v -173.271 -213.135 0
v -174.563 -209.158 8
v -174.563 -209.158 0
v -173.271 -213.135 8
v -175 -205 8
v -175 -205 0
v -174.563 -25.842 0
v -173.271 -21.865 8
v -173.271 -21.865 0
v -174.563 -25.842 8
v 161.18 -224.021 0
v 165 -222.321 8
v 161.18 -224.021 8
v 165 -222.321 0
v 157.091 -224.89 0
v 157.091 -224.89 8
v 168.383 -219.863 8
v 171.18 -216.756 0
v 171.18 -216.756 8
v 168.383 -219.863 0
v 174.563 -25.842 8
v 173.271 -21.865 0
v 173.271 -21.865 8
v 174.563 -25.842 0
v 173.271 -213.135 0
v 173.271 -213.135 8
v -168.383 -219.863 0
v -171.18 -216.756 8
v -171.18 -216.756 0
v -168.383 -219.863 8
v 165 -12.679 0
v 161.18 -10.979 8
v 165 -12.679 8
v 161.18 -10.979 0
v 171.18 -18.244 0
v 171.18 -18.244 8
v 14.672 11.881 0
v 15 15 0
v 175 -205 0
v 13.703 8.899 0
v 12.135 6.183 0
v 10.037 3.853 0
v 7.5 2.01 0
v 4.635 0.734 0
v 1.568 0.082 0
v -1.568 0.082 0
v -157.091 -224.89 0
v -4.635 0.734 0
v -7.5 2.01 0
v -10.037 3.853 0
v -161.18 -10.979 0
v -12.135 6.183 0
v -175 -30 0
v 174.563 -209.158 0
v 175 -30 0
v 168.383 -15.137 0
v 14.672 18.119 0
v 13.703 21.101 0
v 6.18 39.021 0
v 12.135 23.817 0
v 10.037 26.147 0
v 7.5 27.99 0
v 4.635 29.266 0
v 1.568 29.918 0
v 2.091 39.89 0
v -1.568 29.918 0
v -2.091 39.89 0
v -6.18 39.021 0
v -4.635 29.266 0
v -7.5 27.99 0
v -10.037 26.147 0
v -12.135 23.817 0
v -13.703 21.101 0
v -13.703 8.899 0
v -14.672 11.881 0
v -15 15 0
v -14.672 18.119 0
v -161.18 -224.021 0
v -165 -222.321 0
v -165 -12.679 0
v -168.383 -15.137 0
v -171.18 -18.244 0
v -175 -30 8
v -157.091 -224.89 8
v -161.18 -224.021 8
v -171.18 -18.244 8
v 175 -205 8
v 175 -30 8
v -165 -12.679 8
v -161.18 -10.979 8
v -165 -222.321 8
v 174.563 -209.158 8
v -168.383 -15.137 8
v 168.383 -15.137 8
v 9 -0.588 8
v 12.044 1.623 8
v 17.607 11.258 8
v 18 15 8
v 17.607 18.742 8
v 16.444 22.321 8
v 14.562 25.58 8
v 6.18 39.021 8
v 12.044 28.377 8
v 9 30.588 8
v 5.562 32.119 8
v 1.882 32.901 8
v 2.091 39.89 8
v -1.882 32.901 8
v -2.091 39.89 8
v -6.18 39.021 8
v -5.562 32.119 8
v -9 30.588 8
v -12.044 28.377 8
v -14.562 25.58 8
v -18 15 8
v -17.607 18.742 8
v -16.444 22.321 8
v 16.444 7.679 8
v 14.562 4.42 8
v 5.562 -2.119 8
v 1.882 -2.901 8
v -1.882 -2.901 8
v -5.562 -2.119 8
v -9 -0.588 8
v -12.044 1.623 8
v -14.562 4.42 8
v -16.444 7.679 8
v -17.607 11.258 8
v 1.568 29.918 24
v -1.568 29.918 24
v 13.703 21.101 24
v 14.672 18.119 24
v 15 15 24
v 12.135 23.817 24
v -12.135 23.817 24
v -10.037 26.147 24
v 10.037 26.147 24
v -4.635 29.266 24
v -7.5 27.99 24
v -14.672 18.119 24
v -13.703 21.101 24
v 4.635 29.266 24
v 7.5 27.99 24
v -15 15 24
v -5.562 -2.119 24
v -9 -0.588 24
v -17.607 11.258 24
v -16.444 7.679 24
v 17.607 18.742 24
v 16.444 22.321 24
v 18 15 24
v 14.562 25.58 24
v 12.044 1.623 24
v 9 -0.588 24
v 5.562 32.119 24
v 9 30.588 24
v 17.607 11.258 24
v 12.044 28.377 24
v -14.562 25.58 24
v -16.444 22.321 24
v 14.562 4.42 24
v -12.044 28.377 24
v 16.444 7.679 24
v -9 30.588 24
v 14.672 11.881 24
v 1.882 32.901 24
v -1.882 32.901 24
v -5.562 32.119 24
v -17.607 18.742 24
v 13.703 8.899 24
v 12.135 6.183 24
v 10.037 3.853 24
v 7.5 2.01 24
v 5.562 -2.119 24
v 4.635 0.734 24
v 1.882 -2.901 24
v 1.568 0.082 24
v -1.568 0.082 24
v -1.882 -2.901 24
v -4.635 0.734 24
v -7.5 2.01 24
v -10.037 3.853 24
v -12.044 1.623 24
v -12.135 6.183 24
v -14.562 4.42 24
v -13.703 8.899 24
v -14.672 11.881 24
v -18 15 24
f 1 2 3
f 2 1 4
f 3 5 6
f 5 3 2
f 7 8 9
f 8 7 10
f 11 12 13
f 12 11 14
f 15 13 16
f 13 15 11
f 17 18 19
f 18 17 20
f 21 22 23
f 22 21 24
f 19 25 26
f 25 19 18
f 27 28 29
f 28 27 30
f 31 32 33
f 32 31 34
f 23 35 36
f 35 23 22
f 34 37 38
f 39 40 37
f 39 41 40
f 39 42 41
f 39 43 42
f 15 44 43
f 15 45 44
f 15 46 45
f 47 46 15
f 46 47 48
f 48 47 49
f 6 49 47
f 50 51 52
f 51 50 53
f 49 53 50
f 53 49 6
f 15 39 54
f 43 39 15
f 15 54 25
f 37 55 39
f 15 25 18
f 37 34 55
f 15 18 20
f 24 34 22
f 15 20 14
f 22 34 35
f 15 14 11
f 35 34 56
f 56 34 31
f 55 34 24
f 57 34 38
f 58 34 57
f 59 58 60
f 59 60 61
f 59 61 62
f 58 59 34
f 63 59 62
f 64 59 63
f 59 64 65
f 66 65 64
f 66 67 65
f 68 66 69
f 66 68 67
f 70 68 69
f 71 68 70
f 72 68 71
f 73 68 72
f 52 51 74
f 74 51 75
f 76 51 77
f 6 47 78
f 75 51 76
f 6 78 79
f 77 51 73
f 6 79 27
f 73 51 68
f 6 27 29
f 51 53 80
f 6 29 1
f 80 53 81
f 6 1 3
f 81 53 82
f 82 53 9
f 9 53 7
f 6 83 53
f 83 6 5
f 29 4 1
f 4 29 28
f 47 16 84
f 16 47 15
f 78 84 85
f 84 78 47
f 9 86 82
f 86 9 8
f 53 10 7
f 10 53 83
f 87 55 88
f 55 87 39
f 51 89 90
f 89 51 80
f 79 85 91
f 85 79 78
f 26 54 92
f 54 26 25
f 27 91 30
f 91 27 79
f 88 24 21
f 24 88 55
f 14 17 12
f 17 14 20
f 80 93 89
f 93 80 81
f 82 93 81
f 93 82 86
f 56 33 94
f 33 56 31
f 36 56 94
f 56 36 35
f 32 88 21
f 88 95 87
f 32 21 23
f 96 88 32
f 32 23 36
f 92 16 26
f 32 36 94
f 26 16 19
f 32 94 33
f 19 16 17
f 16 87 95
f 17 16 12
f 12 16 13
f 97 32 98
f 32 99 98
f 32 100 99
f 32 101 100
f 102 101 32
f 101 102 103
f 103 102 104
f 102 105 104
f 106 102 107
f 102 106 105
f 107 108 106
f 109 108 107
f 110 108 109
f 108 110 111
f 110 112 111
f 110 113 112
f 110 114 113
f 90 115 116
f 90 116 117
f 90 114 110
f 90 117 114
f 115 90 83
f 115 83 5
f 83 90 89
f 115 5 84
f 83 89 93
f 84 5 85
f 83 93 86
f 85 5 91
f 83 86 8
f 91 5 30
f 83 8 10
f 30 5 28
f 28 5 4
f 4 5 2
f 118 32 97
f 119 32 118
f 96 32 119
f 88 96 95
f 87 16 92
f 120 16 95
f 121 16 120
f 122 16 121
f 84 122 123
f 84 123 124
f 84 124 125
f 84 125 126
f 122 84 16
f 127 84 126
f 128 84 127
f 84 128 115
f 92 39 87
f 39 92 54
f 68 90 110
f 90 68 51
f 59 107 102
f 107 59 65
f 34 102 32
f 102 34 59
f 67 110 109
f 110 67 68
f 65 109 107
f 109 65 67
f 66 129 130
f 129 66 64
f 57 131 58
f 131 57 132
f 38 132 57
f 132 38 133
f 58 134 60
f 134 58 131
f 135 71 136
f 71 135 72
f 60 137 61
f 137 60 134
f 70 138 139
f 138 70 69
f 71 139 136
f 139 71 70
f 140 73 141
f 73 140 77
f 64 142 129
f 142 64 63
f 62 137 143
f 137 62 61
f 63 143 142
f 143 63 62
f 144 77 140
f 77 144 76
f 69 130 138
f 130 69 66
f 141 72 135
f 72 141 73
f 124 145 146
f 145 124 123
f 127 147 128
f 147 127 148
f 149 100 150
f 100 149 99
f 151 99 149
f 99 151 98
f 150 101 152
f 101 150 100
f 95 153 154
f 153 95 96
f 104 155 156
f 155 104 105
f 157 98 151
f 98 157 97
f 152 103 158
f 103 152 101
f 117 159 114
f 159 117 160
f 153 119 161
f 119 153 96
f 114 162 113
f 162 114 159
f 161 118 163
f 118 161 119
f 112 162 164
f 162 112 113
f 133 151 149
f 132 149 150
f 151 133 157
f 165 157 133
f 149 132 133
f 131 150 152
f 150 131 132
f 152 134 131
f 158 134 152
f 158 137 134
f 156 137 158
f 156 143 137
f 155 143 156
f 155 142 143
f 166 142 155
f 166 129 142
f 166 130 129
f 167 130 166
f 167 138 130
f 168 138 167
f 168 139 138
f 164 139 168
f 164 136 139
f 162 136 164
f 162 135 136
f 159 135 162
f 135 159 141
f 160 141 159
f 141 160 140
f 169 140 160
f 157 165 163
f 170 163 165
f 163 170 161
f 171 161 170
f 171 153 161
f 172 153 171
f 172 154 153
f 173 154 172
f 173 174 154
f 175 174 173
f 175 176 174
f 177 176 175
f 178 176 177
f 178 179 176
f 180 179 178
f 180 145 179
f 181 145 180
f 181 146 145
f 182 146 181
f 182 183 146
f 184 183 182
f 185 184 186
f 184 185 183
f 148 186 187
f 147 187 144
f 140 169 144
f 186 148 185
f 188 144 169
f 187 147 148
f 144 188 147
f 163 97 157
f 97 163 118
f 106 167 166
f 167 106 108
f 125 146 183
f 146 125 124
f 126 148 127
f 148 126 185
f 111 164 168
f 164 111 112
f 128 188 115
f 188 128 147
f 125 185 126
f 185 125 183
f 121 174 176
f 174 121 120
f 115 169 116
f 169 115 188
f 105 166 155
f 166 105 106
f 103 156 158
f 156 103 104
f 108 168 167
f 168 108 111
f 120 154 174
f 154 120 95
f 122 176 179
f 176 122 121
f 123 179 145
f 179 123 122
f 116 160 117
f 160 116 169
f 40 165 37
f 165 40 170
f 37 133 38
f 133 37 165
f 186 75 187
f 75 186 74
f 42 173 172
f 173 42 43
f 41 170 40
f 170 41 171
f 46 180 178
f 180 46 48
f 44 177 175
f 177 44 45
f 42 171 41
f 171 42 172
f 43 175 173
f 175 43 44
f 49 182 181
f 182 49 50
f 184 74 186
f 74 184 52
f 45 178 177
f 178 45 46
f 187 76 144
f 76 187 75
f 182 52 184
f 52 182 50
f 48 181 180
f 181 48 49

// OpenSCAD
/**
 * pin_length is measured along the same axis as the length of the board.
 * pin_width is the width of the bottom of the pins, where they're widest.
 * pin_thickness is measured along the same axis as the board thickness.
 * tail_width is the width of the tails where they meet the bottom of the pins, where they're narrowest.
 */
module dovetail_pins(pin_length=.75, pin_width=1, pin_thickness=.75, pin_count=4, angle=15, tail_width=1) {
    intersection() {
        translate([0.005, 0.005, 0.005]) cube([(pin_count-1)*(pin_width+tail_width)-0.01, pin_length-0.01, pin_thickness-0.01]);
        dovetail_pins_idealized(
            pin_length=pin_length,
            pin_width=pin_width,
            pin_thickness=pin_thickness,
            pin_count=pin_count,
            angle=angle,
            tail_width=tail_width
        );
    }
}

/**
 * tail_length is measured along the same axis as the length of the board.
 * tail_width is the width of the tails where they meet the board, where they're narrowest.
 * tail_thickness is measured along the same axis as the board thickness.
 * pin_width is the width of the bottom of the pins, where they're widest.
 */
module dovetail_tails(tail_length=.75, tail_width=1, tail_thickness=.75, tail_count=3, angle=15, pin_width=1) {
    pin_count = tail_count + 1;
    pin_thickness = tail_length;
    pin_length = tail_thickness;

    translate([0, 0, tail_thickness]) {
        rotate([-90, 0, 0]) {
            translate([0, 0, -0.005]) {
                difference() {
                    translate([0.005, 0.005, 0.005]) {
                        cube([(pin_count-1)*(pin_width+tail_width)-0.01, tail_thickness-0.01, tail_length-0.01]);
                    }

                    dovetail_pins_idealized(
                        pin_length=pin_length,
                        pin_width=pin_width,
                        pin_thickness=pin_thickness,
                        pin_count=pin_count,
                        angle=angle,
                        tail_width=tail_width
                    );
                }
            }
        }
    }
}

/**
 * Used for generating both pins and tails. Don't call this directly.
 */
module dovetail_pins_idealized(
    pin_length=.75,
    pin_width=1,
    pin_thickness=.75,
    pin_count=4,
    angle=15,
    tail_width=1) {

    pin_width_top = pin_width - ( 2 * tan(angle) * pin_thickness );

    translate([0, pin_length, 0]) {
        rotate([90, 0, 0]) {
            intersection() {
                cube([(pin_count-1)*(pin_width+tail_width), pin_thickness, pin_length]);

                for (pin = [0:pin_count-1]) {
                    translate([pin * (pin_width + tail_width), 0]) {
                        linear_extrude(pin_length) {
                            polygon([
                                [-pin_width/2, 0],
                                [-pin_width_top/2, pin_thickness],
                                [pin_width_top/2, pin_thickness],
                                [pin_width/2, 0]
                            ]);
                        }
                    }
                }
            }
        }
    }
}

/**
 * Determine the width the pins need to be once the tail widths are chosen.
 */
function pin_width (tail_width, tail_count, board_width) = ( board_width - (tail_width * tail_count) ) / (tail_count);

module platform(size) {
  width = size[0];
  diameter = size[1];
  height = size[2];
  platform_depth = size[3];

  radius = 20;
  y = diameter * 2;
  x = width / 2;

  translate([0,-platform_offset,0]) {
    translate([0,-platform_depth,0]) {
      linear_extrude(height=height)
        hull() {
        translate([radius - x, 0, 0])
          circle(r=radius);

        translate([x - radius, 0, 0])
          circle(r=radius);

        translate([radius - x, platform_depth, 0])
          circle(r=radius);

        translate([x - radius, platform_depth, 0])
          circle(r=radius);
      }

    }

    linear_extrude(height=height)
      hull() {
      // place 4 circles in the corners, with the given radius
      translate([radius - x, 0, 0])
        circle(r=radius);

      translate([x - radius, 0, 0])
        circle(r=radius);

      translate([0, y-(radius/2), 0])
        circle(r=radius);

    }
  }
}

module hole(d, h) {
  cylinder(h=h, r = d/2);
}

mount_diameter = 30;
mount_radius = mount_diameter / 2;

platform_depth = 175;
connector_height = 24;
platform_height = 8;
platform_width = 350;

platform_offset = mount_diameter;

module mount_cylinder(d, h) {
  difference() {
    hole(d + 6, h);
    translate([0,0,-1]) hole(d, h + 5);
  }
}

union() {
  difference() {
    platform([platform_width, mount_diameter, platform_height, platform_depth]);
    translate([0,mount_diameter/2, 0]) hole(mount_diameter, platform_height);
  }
  translate([0,mount_diameter/2, 0]) mount_cylinder(mount_diameter, connector_height);
}
